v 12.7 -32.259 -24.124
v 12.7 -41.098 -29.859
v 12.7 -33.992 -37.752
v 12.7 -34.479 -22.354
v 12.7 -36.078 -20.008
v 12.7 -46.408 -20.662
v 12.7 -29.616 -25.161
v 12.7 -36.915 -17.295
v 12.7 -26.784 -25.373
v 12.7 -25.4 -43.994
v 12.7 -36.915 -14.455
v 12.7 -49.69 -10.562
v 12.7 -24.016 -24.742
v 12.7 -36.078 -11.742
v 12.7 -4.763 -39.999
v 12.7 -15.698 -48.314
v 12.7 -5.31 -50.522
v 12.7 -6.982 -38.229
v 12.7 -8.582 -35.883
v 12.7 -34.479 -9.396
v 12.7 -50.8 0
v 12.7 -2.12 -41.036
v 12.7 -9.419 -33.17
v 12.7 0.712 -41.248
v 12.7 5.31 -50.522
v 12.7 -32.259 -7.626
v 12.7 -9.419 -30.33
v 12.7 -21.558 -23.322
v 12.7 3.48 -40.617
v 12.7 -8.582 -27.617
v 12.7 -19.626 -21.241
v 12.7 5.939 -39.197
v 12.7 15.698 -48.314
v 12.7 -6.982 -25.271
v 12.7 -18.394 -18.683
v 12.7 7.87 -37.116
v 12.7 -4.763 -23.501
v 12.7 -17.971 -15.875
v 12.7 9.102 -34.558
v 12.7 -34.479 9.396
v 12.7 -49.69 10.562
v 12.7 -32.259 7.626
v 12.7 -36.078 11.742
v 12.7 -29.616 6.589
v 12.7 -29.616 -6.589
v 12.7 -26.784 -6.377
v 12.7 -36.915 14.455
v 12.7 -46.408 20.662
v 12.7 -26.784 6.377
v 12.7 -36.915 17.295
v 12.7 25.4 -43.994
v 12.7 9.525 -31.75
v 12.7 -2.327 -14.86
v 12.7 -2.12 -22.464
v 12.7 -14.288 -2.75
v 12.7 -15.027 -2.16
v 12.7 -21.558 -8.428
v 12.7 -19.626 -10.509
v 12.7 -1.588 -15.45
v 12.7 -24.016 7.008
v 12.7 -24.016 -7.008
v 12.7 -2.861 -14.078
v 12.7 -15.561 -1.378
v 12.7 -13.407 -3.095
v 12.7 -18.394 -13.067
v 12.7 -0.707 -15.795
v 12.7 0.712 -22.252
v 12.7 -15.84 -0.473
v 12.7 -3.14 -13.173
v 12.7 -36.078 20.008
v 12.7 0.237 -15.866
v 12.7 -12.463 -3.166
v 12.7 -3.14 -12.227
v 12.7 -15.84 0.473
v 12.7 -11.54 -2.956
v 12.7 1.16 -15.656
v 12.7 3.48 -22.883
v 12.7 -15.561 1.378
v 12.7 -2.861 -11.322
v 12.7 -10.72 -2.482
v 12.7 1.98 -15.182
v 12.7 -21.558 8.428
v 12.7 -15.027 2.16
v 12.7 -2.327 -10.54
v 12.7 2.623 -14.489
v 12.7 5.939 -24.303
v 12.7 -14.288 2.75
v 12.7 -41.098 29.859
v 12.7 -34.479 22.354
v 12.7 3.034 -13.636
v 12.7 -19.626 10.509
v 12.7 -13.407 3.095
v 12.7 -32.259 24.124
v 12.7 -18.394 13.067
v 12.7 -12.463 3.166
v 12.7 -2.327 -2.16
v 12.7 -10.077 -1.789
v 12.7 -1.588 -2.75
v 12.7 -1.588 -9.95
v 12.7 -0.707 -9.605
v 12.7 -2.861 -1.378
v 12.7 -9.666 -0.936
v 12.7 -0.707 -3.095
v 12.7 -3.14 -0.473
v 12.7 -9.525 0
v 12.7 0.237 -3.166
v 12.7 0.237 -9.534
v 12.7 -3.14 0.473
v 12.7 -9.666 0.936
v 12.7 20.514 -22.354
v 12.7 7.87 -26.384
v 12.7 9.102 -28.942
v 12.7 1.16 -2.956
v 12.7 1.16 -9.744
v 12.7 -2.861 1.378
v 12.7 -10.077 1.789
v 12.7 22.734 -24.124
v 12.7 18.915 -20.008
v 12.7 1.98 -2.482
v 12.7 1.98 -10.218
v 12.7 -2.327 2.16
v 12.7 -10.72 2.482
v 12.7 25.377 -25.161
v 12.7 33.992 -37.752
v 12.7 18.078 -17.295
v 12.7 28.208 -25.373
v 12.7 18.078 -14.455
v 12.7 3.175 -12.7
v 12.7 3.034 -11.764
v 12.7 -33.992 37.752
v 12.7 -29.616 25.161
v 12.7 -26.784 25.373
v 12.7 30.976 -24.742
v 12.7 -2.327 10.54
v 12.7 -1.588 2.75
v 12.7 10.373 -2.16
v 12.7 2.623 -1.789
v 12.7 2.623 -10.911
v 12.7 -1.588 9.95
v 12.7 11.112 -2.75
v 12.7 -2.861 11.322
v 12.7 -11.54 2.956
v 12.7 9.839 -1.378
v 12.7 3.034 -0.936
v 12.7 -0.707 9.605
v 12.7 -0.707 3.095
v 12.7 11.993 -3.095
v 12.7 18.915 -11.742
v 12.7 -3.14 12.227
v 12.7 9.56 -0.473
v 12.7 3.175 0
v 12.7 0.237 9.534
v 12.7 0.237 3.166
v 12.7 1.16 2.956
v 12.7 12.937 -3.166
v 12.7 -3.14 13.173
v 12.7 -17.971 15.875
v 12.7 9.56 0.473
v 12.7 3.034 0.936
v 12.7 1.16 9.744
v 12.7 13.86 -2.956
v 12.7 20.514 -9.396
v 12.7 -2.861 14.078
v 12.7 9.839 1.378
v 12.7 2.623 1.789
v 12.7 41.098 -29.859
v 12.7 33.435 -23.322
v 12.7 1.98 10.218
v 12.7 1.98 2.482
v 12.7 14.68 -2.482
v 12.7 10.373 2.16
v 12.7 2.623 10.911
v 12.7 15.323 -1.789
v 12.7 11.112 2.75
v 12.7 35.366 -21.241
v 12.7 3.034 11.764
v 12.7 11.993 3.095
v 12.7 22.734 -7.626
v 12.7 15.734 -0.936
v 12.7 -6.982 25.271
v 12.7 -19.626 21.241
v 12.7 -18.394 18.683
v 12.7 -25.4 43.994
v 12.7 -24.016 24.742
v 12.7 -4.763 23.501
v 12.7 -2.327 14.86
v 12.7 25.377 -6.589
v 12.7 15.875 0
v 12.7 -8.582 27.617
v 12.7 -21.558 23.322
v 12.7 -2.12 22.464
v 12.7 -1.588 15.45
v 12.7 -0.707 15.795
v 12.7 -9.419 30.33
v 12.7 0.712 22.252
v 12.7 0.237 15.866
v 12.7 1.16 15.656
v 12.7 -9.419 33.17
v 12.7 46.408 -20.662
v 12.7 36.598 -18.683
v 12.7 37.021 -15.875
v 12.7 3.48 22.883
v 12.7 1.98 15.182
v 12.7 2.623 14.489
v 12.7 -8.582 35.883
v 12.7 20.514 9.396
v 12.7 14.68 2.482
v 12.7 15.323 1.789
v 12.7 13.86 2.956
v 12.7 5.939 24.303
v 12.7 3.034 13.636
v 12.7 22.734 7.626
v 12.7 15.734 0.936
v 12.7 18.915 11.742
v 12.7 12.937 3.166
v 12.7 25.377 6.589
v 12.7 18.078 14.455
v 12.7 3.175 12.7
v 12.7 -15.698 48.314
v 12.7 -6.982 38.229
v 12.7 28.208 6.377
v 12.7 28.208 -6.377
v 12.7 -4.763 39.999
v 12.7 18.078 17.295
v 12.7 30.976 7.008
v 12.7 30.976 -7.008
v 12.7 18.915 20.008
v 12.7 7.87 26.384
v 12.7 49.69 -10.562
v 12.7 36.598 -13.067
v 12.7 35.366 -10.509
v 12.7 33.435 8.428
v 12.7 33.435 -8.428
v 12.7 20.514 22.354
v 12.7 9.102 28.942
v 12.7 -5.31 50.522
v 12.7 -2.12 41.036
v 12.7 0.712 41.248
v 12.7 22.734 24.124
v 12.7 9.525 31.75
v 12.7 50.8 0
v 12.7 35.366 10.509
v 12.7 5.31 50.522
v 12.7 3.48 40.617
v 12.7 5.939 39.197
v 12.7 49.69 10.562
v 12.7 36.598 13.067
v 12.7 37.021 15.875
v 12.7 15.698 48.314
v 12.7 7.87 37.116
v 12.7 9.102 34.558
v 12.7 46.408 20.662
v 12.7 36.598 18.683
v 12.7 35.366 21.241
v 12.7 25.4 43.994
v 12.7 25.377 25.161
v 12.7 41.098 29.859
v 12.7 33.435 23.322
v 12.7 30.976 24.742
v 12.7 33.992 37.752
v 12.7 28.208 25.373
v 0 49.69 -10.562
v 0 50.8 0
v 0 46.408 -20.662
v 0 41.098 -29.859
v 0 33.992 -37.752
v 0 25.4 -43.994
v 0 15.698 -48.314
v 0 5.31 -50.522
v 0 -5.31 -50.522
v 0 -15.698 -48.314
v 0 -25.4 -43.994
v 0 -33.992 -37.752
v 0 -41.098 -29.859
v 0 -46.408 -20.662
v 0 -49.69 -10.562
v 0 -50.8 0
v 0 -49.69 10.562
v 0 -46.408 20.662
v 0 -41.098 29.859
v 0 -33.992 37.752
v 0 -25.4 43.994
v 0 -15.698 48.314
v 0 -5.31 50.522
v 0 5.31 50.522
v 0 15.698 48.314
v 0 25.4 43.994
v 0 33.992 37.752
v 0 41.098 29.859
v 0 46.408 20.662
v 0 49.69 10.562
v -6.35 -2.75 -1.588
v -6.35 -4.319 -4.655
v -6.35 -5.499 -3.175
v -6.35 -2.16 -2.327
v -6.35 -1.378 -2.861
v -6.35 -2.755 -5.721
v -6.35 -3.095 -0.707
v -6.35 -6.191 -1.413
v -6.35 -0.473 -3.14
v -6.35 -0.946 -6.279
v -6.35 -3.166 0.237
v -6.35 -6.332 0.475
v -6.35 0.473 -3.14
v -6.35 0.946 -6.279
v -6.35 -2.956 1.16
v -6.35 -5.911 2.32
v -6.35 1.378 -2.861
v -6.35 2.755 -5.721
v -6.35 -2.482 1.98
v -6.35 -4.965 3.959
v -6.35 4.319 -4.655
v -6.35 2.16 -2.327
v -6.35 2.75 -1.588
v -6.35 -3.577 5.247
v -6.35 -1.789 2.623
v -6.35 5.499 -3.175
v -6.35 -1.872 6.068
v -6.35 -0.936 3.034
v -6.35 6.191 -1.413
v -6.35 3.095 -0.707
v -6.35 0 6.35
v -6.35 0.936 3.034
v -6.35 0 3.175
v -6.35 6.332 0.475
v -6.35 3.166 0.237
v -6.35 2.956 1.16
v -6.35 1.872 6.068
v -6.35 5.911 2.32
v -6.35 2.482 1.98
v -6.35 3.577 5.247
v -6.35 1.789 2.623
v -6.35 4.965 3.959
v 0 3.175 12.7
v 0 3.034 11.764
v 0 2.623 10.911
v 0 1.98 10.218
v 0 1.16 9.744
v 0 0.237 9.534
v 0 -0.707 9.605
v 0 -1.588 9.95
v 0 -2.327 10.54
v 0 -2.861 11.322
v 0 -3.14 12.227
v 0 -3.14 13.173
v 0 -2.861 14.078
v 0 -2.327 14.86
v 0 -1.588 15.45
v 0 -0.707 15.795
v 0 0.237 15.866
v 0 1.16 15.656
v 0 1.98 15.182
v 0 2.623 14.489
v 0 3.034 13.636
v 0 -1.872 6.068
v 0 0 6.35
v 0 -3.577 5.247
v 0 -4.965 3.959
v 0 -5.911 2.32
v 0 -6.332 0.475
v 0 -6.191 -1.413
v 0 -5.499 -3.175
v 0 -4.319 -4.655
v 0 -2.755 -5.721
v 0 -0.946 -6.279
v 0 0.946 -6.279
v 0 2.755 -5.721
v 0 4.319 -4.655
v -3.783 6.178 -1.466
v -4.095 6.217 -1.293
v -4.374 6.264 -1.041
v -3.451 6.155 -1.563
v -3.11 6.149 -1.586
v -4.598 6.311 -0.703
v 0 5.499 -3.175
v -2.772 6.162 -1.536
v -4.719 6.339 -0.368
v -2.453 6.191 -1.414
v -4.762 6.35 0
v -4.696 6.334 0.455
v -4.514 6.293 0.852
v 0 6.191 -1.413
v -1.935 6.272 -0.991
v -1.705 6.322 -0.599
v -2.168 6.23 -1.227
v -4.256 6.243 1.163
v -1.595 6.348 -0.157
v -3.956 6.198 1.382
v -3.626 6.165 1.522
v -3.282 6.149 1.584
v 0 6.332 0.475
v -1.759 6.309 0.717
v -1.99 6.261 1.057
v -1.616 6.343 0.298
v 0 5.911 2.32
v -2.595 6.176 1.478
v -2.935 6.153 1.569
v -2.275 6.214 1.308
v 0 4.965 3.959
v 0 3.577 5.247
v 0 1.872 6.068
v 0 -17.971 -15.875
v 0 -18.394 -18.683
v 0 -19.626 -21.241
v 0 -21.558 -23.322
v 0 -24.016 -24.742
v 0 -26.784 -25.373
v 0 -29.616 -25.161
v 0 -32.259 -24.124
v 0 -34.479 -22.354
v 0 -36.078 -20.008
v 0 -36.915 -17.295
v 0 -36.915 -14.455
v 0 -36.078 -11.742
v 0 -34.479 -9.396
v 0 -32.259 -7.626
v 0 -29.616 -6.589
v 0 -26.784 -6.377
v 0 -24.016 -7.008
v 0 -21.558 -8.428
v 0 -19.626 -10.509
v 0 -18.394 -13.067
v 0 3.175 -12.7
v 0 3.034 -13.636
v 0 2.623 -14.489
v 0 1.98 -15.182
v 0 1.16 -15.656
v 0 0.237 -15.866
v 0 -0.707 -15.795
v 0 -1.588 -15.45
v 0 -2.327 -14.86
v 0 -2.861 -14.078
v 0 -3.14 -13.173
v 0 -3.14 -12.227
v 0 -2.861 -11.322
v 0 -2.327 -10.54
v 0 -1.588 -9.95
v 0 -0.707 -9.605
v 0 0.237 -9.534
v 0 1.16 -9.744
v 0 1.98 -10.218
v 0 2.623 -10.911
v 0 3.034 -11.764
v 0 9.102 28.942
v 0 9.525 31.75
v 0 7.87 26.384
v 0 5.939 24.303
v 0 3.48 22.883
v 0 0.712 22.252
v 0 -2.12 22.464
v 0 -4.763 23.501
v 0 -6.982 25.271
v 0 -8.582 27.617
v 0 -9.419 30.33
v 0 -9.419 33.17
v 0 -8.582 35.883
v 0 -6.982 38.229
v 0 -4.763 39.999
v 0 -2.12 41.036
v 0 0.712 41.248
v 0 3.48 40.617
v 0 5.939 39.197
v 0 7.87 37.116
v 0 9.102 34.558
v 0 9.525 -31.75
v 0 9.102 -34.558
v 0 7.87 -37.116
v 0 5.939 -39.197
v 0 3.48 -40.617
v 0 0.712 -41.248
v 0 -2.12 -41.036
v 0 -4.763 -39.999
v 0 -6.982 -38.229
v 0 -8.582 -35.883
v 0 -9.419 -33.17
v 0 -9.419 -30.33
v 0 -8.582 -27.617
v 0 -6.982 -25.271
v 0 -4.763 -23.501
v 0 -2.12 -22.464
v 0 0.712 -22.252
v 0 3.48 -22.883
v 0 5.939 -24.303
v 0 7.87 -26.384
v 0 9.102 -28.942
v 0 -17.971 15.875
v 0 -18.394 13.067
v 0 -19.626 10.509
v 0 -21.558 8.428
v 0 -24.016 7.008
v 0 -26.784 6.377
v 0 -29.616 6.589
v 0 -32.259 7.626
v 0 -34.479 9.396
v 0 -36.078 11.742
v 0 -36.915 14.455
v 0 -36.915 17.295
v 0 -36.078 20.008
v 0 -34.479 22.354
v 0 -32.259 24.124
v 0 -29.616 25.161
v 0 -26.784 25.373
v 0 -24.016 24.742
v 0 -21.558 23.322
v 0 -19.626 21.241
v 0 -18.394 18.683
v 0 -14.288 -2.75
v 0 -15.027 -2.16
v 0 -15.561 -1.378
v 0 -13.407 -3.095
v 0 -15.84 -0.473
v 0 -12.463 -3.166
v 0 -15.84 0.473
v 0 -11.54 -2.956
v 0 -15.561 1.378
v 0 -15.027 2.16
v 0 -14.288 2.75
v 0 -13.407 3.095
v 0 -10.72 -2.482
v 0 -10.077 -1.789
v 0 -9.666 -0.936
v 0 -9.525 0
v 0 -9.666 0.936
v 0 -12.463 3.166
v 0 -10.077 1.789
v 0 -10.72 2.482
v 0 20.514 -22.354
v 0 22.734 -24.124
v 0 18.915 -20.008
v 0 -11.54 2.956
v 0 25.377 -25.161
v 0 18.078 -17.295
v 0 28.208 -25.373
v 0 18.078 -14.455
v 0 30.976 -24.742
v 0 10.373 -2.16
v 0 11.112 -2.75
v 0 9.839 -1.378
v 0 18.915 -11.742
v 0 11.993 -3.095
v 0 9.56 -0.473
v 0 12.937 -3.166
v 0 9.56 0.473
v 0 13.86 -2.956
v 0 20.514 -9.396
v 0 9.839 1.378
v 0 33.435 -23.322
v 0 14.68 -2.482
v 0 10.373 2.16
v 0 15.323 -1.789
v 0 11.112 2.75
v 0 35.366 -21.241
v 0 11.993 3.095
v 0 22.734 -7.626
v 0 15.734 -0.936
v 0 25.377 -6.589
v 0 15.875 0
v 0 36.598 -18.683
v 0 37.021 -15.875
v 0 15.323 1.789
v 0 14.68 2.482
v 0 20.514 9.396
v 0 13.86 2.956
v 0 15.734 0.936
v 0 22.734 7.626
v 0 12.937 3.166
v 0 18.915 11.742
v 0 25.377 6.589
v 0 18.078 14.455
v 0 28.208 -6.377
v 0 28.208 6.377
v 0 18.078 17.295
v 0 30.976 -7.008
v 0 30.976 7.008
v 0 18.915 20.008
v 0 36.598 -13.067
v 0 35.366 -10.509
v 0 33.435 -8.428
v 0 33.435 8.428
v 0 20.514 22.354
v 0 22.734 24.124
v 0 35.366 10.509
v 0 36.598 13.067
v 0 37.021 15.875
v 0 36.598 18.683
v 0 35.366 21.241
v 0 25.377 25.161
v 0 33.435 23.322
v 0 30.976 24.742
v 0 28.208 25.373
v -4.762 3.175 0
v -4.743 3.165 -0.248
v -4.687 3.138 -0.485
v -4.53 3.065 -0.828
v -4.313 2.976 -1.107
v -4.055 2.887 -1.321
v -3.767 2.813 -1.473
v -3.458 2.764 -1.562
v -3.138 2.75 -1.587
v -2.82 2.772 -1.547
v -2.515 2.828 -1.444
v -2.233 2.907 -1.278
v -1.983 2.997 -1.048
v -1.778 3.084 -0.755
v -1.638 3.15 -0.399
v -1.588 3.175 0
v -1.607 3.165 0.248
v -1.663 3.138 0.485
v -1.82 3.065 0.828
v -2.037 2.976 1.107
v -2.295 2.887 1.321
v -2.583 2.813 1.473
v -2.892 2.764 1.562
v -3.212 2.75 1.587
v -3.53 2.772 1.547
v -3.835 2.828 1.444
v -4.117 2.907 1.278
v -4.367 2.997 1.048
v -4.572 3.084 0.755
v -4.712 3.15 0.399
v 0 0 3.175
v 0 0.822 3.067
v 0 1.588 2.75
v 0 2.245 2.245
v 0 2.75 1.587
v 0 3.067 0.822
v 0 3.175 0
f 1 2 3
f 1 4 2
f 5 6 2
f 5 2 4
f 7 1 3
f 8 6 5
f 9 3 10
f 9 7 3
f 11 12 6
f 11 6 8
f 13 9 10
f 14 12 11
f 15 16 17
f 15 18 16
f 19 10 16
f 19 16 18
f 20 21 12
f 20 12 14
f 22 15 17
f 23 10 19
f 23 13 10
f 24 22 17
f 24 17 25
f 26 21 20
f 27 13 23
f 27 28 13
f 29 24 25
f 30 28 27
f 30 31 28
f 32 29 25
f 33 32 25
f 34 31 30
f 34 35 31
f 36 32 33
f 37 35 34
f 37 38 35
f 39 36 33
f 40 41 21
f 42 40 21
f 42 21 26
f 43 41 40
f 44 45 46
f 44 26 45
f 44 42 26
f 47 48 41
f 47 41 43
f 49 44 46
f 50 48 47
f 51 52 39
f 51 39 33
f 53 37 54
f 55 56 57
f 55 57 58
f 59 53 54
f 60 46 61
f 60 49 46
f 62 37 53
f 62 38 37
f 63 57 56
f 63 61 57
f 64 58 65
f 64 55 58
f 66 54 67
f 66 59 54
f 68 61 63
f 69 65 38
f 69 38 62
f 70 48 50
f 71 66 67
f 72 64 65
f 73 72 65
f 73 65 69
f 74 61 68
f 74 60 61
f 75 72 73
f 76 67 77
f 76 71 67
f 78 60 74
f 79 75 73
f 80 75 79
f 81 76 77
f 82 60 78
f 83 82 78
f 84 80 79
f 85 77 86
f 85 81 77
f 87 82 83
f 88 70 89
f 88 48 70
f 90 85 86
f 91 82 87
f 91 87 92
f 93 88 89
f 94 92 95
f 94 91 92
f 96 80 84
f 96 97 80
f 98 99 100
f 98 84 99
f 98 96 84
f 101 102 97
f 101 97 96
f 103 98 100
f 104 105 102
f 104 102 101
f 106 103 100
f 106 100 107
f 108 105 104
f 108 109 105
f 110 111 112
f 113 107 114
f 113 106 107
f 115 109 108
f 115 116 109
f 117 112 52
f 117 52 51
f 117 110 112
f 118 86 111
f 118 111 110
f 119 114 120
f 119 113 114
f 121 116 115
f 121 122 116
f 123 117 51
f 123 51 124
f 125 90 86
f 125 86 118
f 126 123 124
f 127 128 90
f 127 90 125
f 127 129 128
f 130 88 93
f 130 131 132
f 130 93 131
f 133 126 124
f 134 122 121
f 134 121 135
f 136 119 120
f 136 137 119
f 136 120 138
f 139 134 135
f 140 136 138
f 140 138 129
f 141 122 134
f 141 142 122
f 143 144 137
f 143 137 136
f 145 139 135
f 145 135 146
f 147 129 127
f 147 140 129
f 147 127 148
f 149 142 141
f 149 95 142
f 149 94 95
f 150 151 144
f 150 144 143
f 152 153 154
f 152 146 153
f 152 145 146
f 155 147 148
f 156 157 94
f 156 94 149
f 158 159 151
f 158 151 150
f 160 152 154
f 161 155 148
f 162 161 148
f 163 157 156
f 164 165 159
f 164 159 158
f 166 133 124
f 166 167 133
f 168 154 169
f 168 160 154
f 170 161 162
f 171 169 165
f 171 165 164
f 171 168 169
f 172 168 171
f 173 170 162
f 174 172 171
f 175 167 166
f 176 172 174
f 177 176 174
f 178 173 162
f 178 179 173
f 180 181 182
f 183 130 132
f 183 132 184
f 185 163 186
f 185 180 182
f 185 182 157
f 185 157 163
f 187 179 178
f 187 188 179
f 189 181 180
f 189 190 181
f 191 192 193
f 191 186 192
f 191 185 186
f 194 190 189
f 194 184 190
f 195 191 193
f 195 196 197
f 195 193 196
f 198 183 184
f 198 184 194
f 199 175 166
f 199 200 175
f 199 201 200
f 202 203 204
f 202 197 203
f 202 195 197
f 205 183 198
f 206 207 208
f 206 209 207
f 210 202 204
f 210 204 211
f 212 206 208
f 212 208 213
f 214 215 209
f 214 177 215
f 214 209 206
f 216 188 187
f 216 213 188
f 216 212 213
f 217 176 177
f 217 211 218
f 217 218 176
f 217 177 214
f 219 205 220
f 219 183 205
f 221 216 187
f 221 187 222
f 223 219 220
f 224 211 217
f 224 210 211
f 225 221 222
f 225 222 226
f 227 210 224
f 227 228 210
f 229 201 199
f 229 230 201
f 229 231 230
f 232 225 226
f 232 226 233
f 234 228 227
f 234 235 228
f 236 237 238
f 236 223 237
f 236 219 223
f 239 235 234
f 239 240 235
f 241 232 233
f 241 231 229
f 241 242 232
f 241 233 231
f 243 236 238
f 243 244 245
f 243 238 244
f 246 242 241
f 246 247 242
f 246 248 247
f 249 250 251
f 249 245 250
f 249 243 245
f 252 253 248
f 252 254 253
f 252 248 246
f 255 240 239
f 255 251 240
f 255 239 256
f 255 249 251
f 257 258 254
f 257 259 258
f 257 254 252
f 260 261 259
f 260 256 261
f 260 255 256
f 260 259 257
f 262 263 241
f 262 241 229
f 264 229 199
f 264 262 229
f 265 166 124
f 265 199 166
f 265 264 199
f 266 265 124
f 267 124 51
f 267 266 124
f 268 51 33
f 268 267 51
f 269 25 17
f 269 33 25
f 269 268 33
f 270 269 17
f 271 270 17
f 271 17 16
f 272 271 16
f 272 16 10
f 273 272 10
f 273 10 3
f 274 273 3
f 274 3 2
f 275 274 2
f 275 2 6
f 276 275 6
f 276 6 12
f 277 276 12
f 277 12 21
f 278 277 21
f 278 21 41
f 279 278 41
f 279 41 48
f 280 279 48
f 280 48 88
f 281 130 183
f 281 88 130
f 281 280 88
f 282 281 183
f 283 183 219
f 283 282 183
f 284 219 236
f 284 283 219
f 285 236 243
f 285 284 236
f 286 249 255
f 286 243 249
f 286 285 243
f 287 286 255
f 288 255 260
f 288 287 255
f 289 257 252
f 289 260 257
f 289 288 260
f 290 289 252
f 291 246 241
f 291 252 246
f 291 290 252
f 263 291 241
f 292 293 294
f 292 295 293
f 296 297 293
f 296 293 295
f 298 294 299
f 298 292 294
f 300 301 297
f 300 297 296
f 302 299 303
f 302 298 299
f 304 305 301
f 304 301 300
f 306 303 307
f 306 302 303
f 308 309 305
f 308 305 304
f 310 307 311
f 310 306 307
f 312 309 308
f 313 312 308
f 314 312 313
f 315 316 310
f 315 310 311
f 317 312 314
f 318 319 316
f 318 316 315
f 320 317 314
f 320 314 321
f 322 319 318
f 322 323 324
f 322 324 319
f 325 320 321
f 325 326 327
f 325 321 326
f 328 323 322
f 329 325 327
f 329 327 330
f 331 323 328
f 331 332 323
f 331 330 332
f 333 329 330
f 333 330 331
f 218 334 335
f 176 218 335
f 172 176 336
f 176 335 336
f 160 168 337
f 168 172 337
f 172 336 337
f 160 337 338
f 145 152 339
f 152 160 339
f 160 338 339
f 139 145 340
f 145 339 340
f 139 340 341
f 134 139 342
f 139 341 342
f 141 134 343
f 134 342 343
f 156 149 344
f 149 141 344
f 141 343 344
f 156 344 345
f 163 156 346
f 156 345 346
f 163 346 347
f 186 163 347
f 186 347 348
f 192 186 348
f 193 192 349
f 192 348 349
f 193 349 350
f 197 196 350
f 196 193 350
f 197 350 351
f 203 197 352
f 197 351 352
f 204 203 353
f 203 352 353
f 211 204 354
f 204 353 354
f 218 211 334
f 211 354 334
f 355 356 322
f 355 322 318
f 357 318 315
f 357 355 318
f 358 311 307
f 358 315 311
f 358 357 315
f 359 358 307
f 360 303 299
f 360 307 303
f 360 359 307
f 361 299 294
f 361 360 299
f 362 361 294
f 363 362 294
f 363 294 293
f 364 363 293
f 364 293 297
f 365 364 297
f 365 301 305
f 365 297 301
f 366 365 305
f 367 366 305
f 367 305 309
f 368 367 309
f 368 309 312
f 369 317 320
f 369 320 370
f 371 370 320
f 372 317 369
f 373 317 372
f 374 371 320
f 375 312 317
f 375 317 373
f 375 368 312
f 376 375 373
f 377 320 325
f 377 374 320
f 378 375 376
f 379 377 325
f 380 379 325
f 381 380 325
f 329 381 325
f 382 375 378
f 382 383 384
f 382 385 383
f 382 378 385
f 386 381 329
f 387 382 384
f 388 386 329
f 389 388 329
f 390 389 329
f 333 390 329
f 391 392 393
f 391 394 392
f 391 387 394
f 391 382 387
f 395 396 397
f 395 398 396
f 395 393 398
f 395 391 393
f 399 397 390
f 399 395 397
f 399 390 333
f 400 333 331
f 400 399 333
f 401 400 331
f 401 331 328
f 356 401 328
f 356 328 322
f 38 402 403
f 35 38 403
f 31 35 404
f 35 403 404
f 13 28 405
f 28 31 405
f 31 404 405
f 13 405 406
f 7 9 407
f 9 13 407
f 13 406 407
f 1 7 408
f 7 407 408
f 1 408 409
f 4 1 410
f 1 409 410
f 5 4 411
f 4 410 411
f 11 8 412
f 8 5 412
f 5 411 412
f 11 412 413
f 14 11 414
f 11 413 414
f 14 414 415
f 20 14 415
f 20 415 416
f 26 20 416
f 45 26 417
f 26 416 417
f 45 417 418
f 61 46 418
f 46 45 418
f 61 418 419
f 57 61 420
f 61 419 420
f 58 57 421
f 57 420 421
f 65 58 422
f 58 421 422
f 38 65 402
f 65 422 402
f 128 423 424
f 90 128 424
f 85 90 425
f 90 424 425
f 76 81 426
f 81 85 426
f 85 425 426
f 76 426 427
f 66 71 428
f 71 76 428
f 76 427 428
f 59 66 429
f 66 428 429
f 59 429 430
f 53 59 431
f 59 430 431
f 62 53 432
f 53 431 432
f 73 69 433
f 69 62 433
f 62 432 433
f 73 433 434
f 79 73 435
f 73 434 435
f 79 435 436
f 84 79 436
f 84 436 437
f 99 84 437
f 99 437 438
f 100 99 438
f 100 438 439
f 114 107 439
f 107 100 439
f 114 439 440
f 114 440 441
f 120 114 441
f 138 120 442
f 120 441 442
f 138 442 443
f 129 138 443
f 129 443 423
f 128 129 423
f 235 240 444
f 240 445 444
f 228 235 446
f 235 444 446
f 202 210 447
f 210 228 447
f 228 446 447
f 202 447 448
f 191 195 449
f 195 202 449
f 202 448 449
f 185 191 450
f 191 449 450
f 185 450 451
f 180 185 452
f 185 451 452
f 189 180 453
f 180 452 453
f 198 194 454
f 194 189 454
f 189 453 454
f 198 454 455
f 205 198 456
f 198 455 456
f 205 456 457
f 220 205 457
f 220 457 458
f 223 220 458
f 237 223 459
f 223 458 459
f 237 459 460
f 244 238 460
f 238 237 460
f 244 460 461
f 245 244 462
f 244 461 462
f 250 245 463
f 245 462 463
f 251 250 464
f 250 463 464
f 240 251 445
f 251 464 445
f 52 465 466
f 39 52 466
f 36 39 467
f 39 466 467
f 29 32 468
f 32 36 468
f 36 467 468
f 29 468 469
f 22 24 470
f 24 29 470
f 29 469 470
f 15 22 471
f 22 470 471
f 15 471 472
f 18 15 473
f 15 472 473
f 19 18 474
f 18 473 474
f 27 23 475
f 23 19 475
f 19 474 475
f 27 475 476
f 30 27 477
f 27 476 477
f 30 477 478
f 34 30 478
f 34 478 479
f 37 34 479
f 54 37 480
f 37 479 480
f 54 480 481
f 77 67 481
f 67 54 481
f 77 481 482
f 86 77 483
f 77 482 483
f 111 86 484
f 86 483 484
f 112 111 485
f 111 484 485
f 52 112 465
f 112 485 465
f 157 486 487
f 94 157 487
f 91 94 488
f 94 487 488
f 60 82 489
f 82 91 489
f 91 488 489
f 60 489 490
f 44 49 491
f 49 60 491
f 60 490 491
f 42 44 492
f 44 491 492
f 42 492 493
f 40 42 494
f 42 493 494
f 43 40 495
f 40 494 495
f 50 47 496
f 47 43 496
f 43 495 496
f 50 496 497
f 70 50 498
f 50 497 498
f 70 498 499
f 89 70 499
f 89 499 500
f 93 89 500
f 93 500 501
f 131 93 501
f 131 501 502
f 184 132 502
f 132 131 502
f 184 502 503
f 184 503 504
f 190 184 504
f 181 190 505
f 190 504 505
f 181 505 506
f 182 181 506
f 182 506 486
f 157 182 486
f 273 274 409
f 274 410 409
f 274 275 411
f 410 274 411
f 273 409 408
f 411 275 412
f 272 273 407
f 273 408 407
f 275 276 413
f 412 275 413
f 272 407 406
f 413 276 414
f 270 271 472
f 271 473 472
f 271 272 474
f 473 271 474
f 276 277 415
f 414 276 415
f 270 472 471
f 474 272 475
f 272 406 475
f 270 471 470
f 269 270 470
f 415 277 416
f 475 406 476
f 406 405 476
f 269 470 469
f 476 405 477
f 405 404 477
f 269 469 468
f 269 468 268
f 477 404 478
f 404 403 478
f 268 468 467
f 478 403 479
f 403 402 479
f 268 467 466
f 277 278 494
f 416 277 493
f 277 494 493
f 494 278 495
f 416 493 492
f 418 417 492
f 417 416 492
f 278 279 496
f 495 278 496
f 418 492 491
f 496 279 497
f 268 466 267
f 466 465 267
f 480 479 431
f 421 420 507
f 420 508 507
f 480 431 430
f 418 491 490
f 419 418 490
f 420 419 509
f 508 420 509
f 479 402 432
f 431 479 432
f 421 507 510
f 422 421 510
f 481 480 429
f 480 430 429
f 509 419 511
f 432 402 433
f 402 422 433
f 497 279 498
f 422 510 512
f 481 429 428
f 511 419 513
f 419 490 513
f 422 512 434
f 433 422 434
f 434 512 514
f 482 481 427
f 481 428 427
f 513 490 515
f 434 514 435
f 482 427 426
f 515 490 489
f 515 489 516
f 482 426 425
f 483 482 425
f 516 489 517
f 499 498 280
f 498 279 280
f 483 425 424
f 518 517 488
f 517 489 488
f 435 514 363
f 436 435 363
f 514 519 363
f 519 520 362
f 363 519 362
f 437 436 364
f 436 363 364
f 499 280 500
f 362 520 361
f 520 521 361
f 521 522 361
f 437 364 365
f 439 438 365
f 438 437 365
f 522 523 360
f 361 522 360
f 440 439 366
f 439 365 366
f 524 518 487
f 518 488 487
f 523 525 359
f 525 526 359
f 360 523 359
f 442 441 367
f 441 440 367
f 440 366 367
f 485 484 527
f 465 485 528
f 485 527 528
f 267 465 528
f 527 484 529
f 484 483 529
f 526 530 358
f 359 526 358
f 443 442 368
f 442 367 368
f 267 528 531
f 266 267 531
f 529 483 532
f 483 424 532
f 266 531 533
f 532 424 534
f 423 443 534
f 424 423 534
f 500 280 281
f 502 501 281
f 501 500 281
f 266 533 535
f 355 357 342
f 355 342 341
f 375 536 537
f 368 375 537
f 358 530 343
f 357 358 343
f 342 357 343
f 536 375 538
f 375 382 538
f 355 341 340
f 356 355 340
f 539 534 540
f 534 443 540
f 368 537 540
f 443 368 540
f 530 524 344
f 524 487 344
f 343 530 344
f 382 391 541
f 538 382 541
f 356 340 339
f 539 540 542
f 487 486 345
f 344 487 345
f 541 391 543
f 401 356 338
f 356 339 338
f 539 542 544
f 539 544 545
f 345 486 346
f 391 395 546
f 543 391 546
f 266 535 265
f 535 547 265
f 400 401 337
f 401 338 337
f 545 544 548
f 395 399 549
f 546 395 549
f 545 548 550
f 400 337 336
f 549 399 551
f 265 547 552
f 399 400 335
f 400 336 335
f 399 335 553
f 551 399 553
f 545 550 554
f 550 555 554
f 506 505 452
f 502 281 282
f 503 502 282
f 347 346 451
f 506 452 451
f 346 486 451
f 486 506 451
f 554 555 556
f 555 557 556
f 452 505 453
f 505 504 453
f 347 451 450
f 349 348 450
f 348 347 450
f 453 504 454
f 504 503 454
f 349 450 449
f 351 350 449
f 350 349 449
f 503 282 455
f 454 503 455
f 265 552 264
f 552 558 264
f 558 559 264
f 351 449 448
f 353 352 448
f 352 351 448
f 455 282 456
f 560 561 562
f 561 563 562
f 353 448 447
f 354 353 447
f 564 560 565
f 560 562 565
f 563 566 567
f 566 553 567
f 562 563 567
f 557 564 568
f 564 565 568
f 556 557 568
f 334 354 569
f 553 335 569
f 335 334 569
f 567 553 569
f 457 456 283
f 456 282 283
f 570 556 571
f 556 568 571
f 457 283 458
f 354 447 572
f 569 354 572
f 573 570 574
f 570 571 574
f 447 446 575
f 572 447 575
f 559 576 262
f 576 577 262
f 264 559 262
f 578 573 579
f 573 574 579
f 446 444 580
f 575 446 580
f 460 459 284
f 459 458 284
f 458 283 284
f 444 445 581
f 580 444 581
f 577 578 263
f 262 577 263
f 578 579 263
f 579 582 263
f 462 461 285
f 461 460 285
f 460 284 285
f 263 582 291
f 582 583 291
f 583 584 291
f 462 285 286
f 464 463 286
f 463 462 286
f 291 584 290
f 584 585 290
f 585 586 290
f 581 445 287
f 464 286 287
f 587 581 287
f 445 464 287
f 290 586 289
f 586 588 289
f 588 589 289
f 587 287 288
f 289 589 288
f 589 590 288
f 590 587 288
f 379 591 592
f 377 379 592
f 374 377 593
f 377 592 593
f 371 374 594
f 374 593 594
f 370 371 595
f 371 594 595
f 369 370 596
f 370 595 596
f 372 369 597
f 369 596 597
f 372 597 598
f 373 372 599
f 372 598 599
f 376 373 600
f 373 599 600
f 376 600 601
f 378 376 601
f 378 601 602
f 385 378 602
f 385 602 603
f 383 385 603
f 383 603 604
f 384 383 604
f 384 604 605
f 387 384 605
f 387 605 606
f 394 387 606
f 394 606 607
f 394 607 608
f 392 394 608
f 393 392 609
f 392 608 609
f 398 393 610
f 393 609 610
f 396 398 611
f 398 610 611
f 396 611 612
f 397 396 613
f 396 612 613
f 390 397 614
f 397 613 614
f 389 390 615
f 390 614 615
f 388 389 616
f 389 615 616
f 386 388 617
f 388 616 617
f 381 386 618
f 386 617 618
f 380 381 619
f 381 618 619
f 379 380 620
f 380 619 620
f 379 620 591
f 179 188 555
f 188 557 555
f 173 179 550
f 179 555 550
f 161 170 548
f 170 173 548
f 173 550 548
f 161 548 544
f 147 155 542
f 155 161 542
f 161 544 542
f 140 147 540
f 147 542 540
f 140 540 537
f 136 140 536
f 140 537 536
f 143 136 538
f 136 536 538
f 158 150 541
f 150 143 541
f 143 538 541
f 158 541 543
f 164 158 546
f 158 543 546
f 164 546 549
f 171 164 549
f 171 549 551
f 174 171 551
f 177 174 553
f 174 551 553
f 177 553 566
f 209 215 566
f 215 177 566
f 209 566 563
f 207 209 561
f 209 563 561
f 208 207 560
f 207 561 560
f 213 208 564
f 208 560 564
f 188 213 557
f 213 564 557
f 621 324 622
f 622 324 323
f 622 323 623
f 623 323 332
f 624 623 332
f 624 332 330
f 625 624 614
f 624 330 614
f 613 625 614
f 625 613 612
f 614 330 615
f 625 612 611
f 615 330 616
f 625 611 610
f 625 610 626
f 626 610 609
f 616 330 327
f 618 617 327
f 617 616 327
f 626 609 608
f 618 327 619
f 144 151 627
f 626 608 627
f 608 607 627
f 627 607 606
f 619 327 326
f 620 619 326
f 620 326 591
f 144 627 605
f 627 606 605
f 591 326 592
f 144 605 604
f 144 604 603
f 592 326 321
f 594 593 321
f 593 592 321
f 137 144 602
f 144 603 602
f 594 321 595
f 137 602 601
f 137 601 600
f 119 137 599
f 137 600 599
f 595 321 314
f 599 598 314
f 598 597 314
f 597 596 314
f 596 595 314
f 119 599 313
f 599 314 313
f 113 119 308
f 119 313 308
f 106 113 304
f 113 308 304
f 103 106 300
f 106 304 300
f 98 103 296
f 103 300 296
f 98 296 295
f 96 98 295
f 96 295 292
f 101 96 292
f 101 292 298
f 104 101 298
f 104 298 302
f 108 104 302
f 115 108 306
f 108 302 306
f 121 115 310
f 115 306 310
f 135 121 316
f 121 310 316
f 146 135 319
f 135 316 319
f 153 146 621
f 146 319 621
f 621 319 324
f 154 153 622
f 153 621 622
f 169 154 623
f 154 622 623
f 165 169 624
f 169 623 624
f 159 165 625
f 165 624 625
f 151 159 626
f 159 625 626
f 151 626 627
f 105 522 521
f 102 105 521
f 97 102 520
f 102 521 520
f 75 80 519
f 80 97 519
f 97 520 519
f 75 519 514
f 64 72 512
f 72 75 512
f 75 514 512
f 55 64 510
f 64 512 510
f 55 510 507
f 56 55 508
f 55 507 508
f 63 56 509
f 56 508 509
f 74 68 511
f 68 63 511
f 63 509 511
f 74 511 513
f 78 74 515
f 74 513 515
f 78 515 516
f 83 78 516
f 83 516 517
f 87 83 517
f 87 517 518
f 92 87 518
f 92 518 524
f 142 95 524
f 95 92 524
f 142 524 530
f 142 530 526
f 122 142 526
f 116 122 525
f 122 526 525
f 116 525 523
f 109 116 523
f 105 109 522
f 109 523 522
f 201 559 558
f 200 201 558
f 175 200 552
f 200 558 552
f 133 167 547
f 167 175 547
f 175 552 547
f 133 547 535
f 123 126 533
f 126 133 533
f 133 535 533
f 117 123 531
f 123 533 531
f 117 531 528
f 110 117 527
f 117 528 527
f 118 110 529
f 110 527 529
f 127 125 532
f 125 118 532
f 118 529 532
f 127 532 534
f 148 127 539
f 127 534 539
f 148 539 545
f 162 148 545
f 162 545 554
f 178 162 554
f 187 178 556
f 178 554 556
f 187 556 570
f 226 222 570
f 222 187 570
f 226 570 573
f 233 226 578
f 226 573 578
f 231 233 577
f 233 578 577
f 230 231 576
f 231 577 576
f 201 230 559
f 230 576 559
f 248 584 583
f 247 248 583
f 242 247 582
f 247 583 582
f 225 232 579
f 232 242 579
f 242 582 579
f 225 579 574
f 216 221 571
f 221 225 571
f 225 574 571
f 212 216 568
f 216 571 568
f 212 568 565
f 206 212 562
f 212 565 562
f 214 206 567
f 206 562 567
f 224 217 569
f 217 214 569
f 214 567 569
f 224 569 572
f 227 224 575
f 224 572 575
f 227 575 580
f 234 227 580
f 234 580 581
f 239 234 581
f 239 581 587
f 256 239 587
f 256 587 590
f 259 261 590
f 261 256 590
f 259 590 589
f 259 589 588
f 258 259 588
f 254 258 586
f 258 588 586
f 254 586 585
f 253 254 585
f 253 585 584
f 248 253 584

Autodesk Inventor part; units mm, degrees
ref_plane "YZ Plane" through (0, 0, 0) normal (1, 0, 0) x (0, 1, 0)
ref_plane "XZ Plane" through (0, 0, 0) normal (0, 1, 0) x (-1, 0, 0)
ref_plane "XY Plane" through (0, 0, 0) normal (0, 0, 1) x (1, 0, 0)
sketch "Sketch1" plane through (0, 0, 0) normal (1, 0, 0) x (0, 1, 0)
  circle A0 centre (0, 0) radius 50.8
  circle A1 centre (0, 0) radius 3.175
  circle A2 centre (0, -31.75) radius 9.525
  line L0 (0, 0) -> (0, -74.7092) construction
  circle A3 centre (27.4963, -15.875) radius 9.525
  circle A4 centre (27.4963, 15.875) radius 9.525
  circle A5 centre (0, 31.75) radius 9.525
  circle A6 centre (-27.4963, 15.875) radius 9.525
  circle A7 centre (-27.4963, -15.875) radius 9.525
  circle A8 centre (0, -12.7) radius 3.175
  circle A9 centre (12.7, 0) radius 3.175
  circle A10 centre (0, 12.7) radius 3.175
  circle A11 centre (-12.7, 0) radius 3.175
  dimension "d0" = 101.6
  dimension "d1" = 6.35
  dimension "d2" = 19.05
  dimension "d3" = 31.75
  dimension "d6" = 360
  dimension "d16" = 6.35
  dimension "d17" = 12.7
  dimension "d24" = 360
extrude "Extrusion3" add sketch "Sketch1" along normal blind 12.7
sketch "Sketch4" plane through (0, 0, 0) normal (-1, 0, 0) x (0, 0, 1)
  circle A0 centre (0, 0) radius 6.35
  circle A1 centre (0, 0) radius 3.175
  dimension "d28" = 12.7
  dimension "d31" = 6.35
extrude "Extrusion5" add sketch "Sketch4" along normal blind 6.35
sketch "Sketch5" plane through (0, 0, 0) normal (0, 1, 0) x (-1, 0, 0)
  circle A0 centre (3.175, 0) radius 1.5875
  line L0 (0, 0) -> (21.9133, 0) construction
  line L1 (6.35, -6.35) -> (6.35, 6.35) construction
  dimension "d34" = 3.175
  dimension "d35" = 3.175
extrude "Extrusion6" cut sketch "Sketch5" along normal through all
properties part number "ShoulderGearYZ"
